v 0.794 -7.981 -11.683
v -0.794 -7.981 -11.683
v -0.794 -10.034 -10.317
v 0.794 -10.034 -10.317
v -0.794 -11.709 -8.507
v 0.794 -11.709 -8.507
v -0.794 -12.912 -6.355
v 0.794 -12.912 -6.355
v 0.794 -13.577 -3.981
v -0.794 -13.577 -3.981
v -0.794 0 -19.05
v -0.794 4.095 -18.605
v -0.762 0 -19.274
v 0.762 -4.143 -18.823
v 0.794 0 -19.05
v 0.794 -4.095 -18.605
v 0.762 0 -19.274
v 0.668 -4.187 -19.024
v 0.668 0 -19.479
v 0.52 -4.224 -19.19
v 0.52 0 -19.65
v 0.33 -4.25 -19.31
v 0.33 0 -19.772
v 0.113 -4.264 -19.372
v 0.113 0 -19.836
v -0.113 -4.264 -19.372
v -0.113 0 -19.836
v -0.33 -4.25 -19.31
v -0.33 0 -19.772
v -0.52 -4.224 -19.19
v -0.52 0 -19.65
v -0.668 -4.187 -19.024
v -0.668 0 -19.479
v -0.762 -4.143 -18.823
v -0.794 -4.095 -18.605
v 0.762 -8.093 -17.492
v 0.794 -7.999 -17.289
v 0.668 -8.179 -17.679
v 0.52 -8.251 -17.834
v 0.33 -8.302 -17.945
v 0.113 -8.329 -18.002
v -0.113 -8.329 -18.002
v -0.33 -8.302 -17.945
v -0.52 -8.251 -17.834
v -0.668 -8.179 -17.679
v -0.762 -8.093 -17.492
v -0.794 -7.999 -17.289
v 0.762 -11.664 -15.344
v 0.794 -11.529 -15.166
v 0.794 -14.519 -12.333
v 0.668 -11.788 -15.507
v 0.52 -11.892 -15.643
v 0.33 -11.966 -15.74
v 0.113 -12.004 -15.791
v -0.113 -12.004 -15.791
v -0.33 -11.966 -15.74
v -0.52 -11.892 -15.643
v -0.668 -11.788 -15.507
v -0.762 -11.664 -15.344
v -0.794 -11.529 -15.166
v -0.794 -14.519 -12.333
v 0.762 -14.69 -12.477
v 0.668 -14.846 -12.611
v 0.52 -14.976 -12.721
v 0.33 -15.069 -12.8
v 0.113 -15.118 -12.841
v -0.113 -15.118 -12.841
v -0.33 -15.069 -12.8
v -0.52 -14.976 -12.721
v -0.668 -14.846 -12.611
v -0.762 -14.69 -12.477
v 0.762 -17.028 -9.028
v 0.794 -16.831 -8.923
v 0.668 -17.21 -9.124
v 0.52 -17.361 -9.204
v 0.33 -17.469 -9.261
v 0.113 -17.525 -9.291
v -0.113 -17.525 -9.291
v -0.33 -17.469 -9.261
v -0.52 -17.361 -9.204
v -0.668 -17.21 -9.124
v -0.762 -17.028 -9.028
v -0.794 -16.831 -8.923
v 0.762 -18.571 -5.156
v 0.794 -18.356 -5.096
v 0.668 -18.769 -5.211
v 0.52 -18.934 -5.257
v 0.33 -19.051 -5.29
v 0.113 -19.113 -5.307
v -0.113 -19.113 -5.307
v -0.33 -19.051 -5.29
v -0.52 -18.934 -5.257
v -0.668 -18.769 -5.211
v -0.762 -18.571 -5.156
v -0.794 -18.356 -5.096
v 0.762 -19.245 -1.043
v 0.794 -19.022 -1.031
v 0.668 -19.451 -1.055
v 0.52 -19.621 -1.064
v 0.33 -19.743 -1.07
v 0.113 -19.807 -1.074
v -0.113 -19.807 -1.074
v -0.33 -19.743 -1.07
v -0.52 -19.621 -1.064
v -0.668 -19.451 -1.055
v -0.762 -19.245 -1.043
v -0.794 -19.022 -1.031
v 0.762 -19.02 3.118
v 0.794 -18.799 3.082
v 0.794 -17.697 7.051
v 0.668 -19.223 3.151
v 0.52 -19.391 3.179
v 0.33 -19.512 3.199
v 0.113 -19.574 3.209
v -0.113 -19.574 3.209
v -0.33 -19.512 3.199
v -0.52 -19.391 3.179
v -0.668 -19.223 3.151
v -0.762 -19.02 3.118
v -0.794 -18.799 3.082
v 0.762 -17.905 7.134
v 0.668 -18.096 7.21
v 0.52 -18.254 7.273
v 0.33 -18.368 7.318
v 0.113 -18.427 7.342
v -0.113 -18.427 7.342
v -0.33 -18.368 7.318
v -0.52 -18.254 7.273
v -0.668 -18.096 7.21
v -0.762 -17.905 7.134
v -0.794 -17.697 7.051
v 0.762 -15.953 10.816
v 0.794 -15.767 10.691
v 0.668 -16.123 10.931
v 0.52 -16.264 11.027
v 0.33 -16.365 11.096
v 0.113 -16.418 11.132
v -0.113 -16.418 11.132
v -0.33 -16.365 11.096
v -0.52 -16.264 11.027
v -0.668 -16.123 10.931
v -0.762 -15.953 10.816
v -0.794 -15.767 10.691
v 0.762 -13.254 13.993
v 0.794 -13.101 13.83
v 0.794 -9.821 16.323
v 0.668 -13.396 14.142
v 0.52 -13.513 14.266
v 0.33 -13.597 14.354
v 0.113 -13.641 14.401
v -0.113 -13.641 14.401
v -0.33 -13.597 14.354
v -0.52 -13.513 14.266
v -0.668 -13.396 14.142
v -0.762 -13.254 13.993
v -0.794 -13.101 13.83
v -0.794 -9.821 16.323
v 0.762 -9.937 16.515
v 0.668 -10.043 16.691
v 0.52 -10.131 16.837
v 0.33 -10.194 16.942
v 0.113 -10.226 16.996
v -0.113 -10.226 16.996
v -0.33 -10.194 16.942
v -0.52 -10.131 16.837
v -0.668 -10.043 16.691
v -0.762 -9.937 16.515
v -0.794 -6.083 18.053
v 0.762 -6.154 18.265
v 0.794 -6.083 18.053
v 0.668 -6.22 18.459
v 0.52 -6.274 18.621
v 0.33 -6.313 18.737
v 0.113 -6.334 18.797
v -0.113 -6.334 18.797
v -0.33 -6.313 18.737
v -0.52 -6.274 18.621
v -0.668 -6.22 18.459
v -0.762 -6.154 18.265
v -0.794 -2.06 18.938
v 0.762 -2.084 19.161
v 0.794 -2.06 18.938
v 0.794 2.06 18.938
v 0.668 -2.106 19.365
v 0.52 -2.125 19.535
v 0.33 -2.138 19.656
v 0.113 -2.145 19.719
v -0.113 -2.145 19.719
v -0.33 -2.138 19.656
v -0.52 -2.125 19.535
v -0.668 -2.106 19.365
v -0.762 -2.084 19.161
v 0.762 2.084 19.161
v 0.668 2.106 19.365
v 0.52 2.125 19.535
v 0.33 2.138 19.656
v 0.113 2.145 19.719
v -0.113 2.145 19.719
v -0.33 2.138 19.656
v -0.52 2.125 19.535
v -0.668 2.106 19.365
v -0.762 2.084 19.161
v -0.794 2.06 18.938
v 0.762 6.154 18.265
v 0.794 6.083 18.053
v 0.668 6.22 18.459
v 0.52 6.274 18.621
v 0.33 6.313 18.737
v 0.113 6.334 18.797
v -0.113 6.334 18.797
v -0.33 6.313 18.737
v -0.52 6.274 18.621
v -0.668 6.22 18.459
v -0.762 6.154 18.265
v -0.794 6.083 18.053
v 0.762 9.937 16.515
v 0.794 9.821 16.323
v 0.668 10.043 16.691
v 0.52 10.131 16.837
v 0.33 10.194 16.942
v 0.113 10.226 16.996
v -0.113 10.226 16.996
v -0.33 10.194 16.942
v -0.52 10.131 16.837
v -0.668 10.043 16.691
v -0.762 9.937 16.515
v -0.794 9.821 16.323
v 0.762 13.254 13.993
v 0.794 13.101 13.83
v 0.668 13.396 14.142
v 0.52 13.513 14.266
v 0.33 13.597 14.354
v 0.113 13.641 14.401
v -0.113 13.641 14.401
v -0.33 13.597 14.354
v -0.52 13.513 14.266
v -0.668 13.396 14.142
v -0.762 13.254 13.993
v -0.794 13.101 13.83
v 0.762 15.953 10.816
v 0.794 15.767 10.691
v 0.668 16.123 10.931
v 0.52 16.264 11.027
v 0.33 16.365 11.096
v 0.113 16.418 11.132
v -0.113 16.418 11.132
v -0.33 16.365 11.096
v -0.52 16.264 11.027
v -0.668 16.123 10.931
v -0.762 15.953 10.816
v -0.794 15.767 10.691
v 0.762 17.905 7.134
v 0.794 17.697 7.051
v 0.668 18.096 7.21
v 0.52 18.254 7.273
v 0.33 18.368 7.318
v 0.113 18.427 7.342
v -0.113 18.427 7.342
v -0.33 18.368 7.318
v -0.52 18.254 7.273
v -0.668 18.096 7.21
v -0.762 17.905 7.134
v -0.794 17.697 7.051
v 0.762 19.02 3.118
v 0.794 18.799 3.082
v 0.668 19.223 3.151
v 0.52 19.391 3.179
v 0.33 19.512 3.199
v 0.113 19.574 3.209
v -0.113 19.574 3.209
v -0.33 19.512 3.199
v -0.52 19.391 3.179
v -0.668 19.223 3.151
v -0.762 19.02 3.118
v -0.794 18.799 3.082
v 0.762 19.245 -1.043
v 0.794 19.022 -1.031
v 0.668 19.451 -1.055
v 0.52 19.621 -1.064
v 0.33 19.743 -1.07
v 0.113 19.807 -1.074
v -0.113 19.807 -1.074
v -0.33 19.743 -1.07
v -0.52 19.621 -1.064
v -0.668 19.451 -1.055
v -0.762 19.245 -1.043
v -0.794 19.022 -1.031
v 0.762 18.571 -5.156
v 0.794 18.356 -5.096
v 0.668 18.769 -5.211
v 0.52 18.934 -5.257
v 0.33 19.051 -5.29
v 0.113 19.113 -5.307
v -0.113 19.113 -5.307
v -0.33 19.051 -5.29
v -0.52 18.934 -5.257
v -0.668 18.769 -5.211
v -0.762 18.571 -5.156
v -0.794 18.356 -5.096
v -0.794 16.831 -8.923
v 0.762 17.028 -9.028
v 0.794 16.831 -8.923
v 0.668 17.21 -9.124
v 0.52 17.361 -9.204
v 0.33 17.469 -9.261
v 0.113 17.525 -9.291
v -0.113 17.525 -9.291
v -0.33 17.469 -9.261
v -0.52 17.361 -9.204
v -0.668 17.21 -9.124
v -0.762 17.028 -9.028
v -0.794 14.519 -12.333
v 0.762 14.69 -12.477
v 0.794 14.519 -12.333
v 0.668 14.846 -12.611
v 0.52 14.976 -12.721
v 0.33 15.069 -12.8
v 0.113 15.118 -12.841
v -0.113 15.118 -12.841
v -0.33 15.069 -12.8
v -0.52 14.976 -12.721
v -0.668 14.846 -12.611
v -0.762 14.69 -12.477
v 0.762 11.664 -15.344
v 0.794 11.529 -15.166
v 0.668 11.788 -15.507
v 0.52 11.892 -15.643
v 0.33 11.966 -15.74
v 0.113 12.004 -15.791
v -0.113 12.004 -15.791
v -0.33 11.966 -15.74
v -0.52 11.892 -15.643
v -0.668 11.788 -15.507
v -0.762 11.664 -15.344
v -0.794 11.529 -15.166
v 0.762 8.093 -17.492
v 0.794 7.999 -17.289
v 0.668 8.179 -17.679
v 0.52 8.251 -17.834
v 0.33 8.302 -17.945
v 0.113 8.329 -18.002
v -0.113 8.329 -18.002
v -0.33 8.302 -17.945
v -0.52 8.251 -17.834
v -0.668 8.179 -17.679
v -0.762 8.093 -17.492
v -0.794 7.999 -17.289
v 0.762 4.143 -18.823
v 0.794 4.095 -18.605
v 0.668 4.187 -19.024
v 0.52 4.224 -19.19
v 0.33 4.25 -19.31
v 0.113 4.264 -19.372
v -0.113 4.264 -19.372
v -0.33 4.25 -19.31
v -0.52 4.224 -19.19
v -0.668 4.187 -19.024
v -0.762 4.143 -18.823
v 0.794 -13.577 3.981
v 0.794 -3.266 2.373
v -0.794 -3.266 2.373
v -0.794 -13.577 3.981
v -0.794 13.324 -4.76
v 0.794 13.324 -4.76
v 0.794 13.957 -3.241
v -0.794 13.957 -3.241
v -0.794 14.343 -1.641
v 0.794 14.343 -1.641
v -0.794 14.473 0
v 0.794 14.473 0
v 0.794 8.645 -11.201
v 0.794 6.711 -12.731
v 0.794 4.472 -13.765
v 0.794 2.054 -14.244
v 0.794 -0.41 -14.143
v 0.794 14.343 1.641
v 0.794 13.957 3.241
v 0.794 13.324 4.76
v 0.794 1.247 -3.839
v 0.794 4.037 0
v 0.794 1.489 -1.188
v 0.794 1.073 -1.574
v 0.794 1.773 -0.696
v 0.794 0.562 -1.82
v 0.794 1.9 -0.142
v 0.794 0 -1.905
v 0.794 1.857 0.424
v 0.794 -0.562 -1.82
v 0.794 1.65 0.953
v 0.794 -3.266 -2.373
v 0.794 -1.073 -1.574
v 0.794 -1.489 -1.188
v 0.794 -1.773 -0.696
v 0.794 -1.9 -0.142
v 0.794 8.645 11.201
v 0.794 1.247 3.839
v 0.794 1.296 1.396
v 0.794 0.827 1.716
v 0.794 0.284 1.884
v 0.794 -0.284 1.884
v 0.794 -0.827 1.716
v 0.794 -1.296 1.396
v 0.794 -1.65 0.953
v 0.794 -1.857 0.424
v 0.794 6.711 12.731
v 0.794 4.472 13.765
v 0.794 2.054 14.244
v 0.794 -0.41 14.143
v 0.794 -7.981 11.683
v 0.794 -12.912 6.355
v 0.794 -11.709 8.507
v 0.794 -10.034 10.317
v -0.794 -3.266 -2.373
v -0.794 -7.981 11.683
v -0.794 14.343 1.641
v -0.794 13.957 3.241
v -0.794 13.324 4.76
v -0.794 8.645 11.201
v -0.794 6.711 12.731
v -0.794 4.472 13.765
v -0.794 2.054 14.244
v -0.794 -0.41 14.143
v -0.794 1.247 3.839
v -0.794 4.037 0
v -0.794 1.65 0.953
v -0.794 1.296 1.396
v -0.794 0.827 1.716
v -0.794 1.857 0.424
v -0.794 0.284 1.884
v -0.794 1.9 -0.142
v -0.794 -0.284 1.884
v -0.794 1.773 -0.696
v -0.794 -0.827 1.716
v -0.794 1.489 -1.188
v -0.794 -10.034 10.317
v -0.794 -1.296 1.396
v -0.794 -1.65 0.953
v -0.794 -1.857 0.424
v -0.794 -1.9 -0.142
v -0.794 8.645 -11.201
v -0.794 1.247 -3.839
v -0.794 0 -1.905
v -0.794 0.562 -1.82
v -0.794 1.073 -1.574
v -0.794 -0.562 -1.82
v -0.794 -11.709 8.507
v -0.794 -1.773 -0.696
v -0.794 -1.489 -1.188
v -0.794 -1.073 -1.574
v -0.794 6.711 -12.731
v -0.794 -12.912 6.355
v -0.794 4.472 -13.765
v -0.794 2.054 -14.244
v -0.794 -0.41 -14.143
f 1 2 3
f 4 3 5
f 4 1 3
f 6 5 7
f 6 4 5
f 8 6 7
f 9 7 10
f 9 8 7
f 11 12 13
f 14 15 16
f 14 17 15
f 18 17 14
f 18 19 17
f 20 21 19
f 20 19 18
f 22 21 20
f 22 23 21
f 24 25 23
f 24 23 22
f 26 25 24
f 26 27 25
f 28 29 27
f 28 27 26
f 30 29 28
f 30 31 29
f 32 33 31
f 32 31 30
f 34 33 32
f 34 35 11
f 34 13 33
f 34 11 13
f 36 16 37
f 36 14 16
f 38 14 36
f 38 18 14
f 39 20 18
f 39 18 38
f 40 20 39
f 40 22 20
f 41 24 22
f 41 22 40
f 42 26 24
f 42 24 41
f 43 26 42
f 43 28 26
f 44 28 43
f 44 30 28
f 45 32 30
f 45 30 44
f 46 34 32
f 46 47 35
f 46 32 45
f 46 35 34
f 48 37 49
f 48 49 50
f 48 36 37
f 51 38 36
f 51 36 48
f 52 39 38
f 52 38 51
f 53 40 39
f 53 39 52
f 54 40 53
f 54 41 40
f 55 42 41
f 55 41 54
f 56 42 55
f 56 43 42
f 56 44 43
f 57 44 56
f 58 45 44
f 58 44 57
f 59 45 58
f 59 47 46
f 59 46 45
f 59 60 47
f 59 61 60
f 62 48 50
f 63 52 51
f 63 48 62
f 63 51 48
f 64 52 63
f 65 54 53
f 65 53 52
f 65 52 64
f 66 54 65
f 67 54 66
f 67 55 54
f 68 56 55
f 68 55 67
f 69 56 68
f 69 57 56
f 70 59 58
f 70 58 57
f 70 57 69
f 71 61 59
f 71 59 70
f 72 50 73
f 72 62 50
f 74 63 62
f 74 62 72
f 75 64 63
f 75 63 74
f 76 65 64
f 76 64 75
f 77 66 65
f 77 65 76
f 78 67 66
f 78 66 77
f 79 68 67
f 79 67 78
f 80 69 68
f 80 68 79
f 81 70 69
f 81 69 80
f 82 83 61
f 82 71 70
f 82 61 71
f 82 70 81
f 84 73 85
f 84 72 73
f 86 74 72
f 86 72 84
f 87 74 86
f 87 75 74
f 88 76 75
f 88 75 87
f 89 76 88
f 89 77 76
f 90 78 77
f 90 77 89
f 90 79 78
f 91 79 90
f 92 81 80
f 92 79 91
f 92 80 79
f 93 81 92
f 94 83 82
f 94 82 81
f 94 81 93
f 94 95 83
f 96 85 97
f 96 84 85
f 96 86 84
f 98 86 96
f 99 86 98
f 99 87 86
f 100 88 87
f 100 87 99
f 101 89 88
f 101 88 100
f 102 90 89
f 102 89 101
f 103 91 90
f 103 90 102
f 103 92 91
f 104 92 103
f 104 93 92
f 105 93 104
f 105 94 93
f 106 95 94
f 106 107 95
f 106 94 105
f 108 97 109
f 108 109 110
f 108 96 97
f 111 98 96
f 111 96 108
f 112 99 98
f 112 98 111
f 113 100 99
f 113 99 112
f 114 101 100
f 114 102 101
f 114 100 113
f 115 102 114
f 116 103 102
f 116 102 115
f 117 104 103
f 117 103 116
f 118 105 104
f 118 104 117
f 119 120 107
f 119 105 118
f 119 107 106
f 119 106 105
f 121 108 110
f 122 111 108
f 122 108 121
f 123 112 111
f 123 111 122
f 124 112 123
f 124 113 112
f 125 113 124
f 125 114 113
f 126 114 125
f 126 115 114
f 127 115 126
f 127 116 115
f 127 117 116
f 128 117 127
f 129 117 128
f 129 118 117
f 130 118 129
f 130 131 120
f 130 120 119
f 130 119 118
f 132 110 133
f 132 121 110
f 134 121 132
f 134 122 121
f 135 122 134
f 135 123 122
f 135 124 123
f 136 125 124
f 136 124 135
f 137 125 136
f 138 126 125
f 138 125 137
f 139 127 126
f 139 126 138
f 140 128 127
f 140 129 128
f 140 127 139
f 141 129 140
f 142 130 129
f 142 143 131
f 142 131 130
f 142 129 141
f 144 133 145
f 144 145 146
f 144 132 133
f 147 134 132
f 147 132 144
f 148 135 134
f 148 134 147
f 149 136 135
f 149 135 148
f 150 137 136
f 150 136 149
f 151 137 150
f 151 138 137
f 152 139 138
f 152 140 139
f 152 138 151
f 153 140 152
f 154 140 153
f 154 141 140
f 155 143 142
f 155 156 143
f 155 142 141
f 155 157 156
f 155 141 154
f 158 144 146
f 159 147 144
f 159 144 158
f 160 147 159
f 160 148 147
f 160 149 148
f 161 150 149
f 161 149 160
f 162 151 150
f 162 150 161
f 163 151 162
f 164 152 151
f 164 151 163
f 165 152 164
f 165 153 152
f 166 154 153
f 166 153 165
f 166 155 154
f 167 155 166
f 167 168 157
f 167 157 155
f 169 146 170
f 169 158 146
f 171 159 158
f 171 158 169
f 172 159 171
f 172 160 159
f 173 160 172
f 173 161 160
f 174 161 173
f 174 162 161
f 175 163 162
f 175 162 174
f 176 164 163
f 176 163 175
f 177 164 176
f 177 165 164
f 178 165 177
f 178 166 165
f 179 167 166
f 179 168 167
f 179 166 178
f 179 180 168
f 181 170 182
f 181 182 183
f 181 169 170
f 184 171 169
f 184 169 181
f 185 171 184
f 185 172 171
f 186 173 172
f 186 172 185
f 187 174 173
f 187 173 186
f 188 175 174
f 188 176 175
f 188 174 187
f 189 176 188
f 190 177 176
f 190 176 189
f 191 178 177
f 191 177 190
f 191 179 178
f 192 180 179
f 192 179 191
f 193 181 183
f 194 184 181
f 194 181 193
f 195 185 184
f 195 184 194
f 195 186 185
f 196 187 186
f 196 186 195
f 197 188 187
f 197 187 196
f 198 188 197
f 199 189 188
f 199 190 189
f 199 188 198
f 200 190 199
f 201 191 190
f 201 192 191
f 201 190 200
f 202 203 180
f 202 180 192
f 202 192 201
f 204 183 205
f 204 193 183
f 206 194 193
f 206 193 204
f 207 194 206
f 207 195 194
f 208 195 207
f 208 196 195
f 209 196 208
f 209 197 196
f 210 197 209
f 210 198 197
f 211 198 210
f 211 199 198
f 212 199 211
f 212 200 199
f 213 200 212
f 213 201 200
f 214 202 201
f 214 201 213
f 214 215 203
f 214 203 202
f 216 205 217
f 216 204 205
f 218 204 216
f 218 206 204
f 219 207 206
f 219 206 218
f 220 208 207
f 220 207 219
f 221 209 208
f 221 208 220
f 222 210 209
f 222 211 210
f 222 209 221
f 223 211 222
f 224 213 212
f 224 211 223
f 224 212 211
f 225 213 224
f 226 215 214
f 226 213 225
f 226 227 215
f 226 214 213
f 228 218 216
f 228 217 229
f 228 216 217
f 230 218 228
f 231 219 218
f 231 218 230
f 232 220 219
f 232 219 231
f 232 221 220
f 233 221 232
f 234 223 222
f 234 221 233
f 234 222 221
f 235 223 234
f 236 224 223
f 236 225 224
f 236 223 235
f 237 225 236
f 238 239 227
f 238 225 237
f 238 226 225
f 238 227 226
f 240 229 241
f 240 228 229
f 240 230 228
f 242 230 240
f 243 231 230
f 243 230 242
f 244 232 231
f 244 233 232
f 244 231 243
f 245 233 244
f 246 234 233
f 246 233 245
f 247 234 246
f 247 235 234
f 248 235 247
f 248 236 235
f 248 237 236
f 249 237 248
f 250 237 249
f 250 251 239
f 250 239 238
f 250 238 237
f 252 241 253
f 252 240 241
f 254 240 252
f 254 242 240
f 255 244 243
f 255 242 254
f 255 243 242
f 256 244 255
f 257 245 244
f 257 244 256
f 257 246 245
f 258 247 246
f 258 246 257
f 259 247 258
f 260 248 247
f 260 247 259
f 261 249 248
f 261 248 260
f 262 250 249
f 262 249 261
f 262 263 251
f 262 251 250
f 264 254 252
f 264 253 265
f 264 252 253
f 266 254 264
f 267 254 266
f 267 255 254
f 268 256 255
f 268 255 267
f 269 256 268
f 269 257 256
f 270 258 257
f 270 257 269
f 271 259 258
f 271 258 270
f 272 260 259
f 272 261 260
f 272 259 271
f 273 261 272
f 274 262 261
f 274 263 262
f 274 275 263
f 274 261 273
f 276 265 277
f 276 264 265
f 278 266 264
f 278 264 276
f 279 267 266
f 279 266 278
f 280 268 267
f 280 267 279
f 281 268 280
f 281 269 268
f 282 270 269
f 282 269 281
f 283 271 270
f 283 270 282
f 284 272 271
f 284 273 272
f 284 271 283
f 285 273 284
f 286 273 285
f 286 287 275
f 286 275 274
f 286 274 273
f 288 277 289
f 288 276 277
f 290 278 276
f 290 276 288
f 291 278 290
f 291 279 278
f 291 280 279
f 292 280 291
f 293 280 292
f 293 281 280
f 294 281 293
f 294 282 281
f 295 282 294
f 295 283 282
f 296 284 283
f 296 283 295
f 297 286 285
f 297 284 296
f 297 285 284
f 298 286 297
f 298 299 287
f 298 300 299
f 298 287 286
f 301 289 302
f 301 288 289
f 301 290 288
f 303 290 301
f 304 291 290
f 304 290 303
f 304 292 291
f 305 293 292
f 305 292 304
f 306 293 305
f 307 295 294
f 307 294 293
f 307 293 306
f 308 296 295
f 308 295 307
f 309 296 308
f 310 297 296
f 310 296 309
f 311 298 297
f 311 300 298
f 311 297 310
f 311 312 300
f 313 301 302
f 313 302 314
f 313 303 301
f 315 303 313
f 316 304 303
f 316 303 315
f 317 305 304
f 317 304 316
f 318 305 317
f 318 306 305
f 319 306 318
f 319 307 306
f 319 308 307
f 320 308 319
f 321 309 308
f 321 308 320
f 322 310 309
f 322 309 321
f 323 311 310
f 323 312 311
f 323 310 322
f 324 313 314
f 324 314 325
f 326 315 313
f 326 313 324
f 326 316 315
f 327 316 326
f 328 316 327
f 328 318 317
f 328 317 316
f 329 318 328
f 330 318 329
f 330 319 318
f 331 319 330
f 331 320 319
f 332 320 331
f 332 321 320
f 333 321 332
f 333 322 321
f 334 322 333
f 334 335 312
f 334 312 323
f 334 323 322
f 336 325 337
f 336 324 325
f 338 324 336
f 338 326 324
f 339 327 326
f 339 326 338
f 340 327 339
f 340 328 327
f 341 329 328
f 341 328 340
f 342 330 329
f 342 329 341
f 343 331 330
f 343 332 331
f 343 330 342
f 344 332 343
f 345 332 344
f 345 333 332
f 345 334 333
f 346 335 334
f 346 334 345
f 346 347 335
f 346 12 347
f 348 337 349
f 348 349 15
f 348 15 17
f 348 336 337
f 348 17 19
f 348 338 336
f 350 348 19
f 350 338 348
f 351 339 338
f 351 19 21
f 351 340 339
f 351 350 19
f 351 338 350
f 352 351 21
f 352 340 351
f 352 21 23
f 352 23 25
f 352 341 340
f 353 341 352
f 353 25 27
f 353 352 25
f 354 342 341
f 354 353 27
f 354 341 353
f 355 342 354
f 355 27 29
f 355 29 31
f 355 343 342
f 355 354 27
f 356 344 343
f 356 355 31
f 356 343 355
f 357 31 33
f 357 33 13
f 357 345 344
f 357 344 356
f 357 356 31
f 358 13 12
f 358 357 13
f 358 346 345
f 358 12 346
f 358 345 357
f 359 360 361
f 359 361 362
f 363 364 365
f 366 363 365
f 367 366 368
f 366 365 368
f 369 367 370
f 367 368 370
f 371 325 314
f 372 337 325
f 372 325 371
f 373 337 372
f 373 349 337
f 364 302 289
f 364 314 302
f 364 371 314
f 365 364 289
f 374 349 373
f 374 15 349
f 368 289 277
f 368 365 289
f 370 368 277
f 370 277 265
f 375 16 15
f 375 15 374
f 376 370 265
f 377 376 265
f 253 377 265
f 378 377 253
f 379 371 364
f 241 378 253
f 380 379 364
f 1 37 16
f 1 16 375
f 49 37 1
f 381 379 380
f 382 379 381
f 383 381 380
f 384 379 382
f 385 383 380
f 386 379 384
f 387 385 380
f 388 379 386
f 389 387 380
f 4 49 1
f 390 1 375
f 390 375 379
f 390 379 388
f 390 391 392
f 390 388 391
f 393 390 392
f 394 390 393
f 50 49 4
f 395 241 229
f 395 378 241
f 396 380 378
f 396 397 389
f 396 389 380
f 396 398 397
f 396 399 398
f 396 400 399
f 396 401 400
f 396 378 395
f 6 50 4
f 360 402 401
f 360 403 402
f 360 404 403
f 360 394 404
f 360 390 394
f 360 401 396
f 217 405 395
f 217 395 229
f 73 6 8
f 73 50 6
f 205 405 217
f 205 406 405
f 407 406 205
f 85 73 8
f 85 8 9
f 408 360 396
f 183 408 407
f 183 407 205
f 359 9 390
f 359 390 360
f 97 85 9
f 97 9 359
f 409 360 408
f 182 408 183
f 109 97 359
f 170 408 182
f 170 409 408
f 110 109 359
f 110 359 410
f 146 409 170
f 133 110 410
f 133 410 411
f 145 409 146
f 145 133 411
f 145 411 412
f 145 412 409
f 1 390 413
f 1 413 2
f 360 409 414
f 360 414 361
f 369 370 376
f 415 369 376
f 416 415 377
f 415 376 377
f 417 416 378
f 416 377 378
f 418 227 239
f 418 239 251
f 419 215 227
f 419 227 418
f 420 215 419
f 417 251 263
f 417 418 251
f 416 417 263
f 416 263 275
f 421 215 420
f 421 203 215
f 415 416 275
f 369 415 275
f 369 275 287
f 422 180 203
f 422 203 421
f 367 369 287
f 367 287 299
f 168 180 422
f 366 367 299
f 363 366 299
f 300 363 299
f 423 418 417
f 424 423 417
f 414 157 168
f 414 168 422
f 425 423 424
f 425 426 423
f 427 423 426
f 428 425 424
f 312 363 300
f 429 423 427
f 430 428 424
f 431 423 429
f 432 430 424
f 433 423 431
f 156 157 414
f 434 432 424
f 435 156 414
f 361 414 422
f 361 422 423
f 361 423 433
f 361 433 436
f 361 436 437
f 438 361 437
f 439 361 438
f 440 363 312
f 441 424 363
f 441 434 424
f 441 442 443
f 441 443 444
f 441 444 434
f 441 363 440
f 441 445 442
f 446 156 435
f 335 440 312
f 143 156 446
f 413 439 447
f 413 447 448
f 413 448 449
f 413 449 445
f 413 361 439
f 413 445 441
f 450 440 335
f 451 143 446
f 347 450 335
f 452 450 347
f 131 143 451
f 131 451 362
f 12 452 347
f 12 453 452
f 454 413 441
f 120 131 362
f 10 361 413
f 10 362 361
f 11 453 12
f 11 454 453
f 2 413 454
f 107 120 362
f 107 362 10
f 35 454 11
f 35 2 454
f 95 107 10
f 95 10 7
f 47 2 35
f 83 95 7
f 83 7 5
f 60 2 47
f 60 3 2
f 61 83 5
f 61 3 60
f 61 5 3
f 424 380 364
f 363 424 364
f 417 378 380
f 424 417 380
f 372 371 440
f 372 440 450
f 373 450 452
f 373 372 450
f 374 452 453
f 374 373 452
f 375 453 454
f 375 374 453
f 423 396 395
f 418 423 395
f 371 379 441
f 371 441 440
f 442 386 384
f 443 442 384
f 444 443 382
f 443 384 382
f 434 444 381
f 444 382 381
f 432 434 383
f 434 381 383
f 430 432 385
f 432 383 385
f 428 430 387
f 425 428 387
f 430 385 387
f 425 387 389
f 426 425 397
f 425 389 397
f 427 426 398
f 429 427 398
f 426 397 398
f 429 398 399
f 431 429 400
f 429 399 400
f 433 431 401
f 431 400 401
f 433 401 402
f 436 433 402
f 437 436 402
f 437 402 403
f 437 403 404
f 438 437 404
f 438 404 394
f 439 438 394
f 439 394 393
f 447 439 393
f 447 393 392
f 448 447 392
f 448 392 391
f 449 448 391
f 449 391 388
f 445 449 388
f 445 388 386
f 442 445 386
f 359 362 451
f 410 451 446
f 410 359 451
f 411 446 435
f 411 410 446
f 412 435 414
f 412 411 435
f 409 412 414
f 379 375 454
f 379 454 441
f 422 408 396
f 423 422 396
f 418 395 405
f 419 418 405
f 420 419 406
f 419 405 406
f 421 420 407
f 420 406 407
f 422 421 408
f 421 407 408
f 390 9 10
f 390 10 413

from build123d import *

# Parameters (mm, degrees)
SKETCH2_R          = 1.905
CUT_EXTRUDE1_DEPTH = 2.54


with BuildPart() as part:
    # Sketch1 → Revolve1 (revolve)
    with BuildSketch(Plane.XY, mode=Mode.PRIVATE) as revolve1_sk:
        with BuildLine():
            Line((0, 0), (0.79375, 0))
            Line((0.79375, 0), (0.79375, 19.05))
            ThreePointArc((0.79375, 19.05), (0, 19.84375), (-0.79375, 19.05))
            Line((-0.79375, 19.05), (-0.79375, 0))
            Line((-0.79375, 0), (0, 0))
        make_face()
    revolve(revolve1_sk.sketch.rotate(Axis((0, 0, 0), (-1, 0, 0)), 90), axis=Axis((0, 0, 0), (-1, 0, 0)))

    # Sketch2 → Cut-Extrude1 (cut)
    with BuildSketch(Plane(origin=(0.79375, 0, 0), x_dir=(0, 0, -1), z_dir=(1, 0, 0))):
        with BuildLine():
            Line((-4.760272123, 13.32409501), (0, 4.036897437))
            Line((0, 4.036897437), (0, 14.472999652))
            ThreePointArc((0, 14.472999652), (-2.448477719, 14.181708244), (-4.760272123, 13.32409501))
        make_face()
        with BuildLine():
            Line((0, 14.472999652), (0, 4.036897437))
            Line((0, 4.036897437), (4.760272123, 13.32409501))
            ThreePointArc((4.760272123, 13.32409501), (2.448477719, 14.181708244), (0, 14.472999652))
        make_face()
        with BuildLine():
            ThreePointArc((11.200962399, 8.644659614), (13.764640629, 4.472402852), (14.142972367, -0.409916029))
            Line((14.142972367, -0.409916029), (3.839317613, 1.247469913))
            Line((3.839317613, 1.247469913), (11.200962399, 8.644659614))
        make_face()
        with BuildLine():
            ThreePointArc((11.682847592, -7.981401547), (8.507015752, -11.708902678), (3.980565502, -13.577437048))
            Line((3.980565502, -13.577437048), (2.372828779, -3.265918631))
            Line((2.372828779, -3.265918631), (11.682847592, -7.981401547))
        make_face()
        with BuildLine():
            ThreePointArc((-3.980565502, -13.577437048), (-8.507015752, -11.708902678), (-11.682847592, -7.981401547))
            Line((-11.682847592, -7.981401547), (-2.372828779, -3.265918631))
            Line((-2.372828779, -3.265918631), (-3.980565502, -13.577437048))
        make_face()
        with BuildLine():
            Line((-3.839317613, 1.247469913), (-11.200962399, 8.644659614))
            ThreePointArc((-11.200962399, 8.644659614), (-13.764640629, 4.472402852), (-14.142972367, -0.409916029))
            Line((-14.142972367, -0.409916029), (-3.839317613, 1.247469913))
        make_face()
        Circle(SKETCH2_R)
    extrude(amount=-CUT_EXTRUDE1_DEPTH, mode=Mode.SUBTRACT)


solid = part.part
